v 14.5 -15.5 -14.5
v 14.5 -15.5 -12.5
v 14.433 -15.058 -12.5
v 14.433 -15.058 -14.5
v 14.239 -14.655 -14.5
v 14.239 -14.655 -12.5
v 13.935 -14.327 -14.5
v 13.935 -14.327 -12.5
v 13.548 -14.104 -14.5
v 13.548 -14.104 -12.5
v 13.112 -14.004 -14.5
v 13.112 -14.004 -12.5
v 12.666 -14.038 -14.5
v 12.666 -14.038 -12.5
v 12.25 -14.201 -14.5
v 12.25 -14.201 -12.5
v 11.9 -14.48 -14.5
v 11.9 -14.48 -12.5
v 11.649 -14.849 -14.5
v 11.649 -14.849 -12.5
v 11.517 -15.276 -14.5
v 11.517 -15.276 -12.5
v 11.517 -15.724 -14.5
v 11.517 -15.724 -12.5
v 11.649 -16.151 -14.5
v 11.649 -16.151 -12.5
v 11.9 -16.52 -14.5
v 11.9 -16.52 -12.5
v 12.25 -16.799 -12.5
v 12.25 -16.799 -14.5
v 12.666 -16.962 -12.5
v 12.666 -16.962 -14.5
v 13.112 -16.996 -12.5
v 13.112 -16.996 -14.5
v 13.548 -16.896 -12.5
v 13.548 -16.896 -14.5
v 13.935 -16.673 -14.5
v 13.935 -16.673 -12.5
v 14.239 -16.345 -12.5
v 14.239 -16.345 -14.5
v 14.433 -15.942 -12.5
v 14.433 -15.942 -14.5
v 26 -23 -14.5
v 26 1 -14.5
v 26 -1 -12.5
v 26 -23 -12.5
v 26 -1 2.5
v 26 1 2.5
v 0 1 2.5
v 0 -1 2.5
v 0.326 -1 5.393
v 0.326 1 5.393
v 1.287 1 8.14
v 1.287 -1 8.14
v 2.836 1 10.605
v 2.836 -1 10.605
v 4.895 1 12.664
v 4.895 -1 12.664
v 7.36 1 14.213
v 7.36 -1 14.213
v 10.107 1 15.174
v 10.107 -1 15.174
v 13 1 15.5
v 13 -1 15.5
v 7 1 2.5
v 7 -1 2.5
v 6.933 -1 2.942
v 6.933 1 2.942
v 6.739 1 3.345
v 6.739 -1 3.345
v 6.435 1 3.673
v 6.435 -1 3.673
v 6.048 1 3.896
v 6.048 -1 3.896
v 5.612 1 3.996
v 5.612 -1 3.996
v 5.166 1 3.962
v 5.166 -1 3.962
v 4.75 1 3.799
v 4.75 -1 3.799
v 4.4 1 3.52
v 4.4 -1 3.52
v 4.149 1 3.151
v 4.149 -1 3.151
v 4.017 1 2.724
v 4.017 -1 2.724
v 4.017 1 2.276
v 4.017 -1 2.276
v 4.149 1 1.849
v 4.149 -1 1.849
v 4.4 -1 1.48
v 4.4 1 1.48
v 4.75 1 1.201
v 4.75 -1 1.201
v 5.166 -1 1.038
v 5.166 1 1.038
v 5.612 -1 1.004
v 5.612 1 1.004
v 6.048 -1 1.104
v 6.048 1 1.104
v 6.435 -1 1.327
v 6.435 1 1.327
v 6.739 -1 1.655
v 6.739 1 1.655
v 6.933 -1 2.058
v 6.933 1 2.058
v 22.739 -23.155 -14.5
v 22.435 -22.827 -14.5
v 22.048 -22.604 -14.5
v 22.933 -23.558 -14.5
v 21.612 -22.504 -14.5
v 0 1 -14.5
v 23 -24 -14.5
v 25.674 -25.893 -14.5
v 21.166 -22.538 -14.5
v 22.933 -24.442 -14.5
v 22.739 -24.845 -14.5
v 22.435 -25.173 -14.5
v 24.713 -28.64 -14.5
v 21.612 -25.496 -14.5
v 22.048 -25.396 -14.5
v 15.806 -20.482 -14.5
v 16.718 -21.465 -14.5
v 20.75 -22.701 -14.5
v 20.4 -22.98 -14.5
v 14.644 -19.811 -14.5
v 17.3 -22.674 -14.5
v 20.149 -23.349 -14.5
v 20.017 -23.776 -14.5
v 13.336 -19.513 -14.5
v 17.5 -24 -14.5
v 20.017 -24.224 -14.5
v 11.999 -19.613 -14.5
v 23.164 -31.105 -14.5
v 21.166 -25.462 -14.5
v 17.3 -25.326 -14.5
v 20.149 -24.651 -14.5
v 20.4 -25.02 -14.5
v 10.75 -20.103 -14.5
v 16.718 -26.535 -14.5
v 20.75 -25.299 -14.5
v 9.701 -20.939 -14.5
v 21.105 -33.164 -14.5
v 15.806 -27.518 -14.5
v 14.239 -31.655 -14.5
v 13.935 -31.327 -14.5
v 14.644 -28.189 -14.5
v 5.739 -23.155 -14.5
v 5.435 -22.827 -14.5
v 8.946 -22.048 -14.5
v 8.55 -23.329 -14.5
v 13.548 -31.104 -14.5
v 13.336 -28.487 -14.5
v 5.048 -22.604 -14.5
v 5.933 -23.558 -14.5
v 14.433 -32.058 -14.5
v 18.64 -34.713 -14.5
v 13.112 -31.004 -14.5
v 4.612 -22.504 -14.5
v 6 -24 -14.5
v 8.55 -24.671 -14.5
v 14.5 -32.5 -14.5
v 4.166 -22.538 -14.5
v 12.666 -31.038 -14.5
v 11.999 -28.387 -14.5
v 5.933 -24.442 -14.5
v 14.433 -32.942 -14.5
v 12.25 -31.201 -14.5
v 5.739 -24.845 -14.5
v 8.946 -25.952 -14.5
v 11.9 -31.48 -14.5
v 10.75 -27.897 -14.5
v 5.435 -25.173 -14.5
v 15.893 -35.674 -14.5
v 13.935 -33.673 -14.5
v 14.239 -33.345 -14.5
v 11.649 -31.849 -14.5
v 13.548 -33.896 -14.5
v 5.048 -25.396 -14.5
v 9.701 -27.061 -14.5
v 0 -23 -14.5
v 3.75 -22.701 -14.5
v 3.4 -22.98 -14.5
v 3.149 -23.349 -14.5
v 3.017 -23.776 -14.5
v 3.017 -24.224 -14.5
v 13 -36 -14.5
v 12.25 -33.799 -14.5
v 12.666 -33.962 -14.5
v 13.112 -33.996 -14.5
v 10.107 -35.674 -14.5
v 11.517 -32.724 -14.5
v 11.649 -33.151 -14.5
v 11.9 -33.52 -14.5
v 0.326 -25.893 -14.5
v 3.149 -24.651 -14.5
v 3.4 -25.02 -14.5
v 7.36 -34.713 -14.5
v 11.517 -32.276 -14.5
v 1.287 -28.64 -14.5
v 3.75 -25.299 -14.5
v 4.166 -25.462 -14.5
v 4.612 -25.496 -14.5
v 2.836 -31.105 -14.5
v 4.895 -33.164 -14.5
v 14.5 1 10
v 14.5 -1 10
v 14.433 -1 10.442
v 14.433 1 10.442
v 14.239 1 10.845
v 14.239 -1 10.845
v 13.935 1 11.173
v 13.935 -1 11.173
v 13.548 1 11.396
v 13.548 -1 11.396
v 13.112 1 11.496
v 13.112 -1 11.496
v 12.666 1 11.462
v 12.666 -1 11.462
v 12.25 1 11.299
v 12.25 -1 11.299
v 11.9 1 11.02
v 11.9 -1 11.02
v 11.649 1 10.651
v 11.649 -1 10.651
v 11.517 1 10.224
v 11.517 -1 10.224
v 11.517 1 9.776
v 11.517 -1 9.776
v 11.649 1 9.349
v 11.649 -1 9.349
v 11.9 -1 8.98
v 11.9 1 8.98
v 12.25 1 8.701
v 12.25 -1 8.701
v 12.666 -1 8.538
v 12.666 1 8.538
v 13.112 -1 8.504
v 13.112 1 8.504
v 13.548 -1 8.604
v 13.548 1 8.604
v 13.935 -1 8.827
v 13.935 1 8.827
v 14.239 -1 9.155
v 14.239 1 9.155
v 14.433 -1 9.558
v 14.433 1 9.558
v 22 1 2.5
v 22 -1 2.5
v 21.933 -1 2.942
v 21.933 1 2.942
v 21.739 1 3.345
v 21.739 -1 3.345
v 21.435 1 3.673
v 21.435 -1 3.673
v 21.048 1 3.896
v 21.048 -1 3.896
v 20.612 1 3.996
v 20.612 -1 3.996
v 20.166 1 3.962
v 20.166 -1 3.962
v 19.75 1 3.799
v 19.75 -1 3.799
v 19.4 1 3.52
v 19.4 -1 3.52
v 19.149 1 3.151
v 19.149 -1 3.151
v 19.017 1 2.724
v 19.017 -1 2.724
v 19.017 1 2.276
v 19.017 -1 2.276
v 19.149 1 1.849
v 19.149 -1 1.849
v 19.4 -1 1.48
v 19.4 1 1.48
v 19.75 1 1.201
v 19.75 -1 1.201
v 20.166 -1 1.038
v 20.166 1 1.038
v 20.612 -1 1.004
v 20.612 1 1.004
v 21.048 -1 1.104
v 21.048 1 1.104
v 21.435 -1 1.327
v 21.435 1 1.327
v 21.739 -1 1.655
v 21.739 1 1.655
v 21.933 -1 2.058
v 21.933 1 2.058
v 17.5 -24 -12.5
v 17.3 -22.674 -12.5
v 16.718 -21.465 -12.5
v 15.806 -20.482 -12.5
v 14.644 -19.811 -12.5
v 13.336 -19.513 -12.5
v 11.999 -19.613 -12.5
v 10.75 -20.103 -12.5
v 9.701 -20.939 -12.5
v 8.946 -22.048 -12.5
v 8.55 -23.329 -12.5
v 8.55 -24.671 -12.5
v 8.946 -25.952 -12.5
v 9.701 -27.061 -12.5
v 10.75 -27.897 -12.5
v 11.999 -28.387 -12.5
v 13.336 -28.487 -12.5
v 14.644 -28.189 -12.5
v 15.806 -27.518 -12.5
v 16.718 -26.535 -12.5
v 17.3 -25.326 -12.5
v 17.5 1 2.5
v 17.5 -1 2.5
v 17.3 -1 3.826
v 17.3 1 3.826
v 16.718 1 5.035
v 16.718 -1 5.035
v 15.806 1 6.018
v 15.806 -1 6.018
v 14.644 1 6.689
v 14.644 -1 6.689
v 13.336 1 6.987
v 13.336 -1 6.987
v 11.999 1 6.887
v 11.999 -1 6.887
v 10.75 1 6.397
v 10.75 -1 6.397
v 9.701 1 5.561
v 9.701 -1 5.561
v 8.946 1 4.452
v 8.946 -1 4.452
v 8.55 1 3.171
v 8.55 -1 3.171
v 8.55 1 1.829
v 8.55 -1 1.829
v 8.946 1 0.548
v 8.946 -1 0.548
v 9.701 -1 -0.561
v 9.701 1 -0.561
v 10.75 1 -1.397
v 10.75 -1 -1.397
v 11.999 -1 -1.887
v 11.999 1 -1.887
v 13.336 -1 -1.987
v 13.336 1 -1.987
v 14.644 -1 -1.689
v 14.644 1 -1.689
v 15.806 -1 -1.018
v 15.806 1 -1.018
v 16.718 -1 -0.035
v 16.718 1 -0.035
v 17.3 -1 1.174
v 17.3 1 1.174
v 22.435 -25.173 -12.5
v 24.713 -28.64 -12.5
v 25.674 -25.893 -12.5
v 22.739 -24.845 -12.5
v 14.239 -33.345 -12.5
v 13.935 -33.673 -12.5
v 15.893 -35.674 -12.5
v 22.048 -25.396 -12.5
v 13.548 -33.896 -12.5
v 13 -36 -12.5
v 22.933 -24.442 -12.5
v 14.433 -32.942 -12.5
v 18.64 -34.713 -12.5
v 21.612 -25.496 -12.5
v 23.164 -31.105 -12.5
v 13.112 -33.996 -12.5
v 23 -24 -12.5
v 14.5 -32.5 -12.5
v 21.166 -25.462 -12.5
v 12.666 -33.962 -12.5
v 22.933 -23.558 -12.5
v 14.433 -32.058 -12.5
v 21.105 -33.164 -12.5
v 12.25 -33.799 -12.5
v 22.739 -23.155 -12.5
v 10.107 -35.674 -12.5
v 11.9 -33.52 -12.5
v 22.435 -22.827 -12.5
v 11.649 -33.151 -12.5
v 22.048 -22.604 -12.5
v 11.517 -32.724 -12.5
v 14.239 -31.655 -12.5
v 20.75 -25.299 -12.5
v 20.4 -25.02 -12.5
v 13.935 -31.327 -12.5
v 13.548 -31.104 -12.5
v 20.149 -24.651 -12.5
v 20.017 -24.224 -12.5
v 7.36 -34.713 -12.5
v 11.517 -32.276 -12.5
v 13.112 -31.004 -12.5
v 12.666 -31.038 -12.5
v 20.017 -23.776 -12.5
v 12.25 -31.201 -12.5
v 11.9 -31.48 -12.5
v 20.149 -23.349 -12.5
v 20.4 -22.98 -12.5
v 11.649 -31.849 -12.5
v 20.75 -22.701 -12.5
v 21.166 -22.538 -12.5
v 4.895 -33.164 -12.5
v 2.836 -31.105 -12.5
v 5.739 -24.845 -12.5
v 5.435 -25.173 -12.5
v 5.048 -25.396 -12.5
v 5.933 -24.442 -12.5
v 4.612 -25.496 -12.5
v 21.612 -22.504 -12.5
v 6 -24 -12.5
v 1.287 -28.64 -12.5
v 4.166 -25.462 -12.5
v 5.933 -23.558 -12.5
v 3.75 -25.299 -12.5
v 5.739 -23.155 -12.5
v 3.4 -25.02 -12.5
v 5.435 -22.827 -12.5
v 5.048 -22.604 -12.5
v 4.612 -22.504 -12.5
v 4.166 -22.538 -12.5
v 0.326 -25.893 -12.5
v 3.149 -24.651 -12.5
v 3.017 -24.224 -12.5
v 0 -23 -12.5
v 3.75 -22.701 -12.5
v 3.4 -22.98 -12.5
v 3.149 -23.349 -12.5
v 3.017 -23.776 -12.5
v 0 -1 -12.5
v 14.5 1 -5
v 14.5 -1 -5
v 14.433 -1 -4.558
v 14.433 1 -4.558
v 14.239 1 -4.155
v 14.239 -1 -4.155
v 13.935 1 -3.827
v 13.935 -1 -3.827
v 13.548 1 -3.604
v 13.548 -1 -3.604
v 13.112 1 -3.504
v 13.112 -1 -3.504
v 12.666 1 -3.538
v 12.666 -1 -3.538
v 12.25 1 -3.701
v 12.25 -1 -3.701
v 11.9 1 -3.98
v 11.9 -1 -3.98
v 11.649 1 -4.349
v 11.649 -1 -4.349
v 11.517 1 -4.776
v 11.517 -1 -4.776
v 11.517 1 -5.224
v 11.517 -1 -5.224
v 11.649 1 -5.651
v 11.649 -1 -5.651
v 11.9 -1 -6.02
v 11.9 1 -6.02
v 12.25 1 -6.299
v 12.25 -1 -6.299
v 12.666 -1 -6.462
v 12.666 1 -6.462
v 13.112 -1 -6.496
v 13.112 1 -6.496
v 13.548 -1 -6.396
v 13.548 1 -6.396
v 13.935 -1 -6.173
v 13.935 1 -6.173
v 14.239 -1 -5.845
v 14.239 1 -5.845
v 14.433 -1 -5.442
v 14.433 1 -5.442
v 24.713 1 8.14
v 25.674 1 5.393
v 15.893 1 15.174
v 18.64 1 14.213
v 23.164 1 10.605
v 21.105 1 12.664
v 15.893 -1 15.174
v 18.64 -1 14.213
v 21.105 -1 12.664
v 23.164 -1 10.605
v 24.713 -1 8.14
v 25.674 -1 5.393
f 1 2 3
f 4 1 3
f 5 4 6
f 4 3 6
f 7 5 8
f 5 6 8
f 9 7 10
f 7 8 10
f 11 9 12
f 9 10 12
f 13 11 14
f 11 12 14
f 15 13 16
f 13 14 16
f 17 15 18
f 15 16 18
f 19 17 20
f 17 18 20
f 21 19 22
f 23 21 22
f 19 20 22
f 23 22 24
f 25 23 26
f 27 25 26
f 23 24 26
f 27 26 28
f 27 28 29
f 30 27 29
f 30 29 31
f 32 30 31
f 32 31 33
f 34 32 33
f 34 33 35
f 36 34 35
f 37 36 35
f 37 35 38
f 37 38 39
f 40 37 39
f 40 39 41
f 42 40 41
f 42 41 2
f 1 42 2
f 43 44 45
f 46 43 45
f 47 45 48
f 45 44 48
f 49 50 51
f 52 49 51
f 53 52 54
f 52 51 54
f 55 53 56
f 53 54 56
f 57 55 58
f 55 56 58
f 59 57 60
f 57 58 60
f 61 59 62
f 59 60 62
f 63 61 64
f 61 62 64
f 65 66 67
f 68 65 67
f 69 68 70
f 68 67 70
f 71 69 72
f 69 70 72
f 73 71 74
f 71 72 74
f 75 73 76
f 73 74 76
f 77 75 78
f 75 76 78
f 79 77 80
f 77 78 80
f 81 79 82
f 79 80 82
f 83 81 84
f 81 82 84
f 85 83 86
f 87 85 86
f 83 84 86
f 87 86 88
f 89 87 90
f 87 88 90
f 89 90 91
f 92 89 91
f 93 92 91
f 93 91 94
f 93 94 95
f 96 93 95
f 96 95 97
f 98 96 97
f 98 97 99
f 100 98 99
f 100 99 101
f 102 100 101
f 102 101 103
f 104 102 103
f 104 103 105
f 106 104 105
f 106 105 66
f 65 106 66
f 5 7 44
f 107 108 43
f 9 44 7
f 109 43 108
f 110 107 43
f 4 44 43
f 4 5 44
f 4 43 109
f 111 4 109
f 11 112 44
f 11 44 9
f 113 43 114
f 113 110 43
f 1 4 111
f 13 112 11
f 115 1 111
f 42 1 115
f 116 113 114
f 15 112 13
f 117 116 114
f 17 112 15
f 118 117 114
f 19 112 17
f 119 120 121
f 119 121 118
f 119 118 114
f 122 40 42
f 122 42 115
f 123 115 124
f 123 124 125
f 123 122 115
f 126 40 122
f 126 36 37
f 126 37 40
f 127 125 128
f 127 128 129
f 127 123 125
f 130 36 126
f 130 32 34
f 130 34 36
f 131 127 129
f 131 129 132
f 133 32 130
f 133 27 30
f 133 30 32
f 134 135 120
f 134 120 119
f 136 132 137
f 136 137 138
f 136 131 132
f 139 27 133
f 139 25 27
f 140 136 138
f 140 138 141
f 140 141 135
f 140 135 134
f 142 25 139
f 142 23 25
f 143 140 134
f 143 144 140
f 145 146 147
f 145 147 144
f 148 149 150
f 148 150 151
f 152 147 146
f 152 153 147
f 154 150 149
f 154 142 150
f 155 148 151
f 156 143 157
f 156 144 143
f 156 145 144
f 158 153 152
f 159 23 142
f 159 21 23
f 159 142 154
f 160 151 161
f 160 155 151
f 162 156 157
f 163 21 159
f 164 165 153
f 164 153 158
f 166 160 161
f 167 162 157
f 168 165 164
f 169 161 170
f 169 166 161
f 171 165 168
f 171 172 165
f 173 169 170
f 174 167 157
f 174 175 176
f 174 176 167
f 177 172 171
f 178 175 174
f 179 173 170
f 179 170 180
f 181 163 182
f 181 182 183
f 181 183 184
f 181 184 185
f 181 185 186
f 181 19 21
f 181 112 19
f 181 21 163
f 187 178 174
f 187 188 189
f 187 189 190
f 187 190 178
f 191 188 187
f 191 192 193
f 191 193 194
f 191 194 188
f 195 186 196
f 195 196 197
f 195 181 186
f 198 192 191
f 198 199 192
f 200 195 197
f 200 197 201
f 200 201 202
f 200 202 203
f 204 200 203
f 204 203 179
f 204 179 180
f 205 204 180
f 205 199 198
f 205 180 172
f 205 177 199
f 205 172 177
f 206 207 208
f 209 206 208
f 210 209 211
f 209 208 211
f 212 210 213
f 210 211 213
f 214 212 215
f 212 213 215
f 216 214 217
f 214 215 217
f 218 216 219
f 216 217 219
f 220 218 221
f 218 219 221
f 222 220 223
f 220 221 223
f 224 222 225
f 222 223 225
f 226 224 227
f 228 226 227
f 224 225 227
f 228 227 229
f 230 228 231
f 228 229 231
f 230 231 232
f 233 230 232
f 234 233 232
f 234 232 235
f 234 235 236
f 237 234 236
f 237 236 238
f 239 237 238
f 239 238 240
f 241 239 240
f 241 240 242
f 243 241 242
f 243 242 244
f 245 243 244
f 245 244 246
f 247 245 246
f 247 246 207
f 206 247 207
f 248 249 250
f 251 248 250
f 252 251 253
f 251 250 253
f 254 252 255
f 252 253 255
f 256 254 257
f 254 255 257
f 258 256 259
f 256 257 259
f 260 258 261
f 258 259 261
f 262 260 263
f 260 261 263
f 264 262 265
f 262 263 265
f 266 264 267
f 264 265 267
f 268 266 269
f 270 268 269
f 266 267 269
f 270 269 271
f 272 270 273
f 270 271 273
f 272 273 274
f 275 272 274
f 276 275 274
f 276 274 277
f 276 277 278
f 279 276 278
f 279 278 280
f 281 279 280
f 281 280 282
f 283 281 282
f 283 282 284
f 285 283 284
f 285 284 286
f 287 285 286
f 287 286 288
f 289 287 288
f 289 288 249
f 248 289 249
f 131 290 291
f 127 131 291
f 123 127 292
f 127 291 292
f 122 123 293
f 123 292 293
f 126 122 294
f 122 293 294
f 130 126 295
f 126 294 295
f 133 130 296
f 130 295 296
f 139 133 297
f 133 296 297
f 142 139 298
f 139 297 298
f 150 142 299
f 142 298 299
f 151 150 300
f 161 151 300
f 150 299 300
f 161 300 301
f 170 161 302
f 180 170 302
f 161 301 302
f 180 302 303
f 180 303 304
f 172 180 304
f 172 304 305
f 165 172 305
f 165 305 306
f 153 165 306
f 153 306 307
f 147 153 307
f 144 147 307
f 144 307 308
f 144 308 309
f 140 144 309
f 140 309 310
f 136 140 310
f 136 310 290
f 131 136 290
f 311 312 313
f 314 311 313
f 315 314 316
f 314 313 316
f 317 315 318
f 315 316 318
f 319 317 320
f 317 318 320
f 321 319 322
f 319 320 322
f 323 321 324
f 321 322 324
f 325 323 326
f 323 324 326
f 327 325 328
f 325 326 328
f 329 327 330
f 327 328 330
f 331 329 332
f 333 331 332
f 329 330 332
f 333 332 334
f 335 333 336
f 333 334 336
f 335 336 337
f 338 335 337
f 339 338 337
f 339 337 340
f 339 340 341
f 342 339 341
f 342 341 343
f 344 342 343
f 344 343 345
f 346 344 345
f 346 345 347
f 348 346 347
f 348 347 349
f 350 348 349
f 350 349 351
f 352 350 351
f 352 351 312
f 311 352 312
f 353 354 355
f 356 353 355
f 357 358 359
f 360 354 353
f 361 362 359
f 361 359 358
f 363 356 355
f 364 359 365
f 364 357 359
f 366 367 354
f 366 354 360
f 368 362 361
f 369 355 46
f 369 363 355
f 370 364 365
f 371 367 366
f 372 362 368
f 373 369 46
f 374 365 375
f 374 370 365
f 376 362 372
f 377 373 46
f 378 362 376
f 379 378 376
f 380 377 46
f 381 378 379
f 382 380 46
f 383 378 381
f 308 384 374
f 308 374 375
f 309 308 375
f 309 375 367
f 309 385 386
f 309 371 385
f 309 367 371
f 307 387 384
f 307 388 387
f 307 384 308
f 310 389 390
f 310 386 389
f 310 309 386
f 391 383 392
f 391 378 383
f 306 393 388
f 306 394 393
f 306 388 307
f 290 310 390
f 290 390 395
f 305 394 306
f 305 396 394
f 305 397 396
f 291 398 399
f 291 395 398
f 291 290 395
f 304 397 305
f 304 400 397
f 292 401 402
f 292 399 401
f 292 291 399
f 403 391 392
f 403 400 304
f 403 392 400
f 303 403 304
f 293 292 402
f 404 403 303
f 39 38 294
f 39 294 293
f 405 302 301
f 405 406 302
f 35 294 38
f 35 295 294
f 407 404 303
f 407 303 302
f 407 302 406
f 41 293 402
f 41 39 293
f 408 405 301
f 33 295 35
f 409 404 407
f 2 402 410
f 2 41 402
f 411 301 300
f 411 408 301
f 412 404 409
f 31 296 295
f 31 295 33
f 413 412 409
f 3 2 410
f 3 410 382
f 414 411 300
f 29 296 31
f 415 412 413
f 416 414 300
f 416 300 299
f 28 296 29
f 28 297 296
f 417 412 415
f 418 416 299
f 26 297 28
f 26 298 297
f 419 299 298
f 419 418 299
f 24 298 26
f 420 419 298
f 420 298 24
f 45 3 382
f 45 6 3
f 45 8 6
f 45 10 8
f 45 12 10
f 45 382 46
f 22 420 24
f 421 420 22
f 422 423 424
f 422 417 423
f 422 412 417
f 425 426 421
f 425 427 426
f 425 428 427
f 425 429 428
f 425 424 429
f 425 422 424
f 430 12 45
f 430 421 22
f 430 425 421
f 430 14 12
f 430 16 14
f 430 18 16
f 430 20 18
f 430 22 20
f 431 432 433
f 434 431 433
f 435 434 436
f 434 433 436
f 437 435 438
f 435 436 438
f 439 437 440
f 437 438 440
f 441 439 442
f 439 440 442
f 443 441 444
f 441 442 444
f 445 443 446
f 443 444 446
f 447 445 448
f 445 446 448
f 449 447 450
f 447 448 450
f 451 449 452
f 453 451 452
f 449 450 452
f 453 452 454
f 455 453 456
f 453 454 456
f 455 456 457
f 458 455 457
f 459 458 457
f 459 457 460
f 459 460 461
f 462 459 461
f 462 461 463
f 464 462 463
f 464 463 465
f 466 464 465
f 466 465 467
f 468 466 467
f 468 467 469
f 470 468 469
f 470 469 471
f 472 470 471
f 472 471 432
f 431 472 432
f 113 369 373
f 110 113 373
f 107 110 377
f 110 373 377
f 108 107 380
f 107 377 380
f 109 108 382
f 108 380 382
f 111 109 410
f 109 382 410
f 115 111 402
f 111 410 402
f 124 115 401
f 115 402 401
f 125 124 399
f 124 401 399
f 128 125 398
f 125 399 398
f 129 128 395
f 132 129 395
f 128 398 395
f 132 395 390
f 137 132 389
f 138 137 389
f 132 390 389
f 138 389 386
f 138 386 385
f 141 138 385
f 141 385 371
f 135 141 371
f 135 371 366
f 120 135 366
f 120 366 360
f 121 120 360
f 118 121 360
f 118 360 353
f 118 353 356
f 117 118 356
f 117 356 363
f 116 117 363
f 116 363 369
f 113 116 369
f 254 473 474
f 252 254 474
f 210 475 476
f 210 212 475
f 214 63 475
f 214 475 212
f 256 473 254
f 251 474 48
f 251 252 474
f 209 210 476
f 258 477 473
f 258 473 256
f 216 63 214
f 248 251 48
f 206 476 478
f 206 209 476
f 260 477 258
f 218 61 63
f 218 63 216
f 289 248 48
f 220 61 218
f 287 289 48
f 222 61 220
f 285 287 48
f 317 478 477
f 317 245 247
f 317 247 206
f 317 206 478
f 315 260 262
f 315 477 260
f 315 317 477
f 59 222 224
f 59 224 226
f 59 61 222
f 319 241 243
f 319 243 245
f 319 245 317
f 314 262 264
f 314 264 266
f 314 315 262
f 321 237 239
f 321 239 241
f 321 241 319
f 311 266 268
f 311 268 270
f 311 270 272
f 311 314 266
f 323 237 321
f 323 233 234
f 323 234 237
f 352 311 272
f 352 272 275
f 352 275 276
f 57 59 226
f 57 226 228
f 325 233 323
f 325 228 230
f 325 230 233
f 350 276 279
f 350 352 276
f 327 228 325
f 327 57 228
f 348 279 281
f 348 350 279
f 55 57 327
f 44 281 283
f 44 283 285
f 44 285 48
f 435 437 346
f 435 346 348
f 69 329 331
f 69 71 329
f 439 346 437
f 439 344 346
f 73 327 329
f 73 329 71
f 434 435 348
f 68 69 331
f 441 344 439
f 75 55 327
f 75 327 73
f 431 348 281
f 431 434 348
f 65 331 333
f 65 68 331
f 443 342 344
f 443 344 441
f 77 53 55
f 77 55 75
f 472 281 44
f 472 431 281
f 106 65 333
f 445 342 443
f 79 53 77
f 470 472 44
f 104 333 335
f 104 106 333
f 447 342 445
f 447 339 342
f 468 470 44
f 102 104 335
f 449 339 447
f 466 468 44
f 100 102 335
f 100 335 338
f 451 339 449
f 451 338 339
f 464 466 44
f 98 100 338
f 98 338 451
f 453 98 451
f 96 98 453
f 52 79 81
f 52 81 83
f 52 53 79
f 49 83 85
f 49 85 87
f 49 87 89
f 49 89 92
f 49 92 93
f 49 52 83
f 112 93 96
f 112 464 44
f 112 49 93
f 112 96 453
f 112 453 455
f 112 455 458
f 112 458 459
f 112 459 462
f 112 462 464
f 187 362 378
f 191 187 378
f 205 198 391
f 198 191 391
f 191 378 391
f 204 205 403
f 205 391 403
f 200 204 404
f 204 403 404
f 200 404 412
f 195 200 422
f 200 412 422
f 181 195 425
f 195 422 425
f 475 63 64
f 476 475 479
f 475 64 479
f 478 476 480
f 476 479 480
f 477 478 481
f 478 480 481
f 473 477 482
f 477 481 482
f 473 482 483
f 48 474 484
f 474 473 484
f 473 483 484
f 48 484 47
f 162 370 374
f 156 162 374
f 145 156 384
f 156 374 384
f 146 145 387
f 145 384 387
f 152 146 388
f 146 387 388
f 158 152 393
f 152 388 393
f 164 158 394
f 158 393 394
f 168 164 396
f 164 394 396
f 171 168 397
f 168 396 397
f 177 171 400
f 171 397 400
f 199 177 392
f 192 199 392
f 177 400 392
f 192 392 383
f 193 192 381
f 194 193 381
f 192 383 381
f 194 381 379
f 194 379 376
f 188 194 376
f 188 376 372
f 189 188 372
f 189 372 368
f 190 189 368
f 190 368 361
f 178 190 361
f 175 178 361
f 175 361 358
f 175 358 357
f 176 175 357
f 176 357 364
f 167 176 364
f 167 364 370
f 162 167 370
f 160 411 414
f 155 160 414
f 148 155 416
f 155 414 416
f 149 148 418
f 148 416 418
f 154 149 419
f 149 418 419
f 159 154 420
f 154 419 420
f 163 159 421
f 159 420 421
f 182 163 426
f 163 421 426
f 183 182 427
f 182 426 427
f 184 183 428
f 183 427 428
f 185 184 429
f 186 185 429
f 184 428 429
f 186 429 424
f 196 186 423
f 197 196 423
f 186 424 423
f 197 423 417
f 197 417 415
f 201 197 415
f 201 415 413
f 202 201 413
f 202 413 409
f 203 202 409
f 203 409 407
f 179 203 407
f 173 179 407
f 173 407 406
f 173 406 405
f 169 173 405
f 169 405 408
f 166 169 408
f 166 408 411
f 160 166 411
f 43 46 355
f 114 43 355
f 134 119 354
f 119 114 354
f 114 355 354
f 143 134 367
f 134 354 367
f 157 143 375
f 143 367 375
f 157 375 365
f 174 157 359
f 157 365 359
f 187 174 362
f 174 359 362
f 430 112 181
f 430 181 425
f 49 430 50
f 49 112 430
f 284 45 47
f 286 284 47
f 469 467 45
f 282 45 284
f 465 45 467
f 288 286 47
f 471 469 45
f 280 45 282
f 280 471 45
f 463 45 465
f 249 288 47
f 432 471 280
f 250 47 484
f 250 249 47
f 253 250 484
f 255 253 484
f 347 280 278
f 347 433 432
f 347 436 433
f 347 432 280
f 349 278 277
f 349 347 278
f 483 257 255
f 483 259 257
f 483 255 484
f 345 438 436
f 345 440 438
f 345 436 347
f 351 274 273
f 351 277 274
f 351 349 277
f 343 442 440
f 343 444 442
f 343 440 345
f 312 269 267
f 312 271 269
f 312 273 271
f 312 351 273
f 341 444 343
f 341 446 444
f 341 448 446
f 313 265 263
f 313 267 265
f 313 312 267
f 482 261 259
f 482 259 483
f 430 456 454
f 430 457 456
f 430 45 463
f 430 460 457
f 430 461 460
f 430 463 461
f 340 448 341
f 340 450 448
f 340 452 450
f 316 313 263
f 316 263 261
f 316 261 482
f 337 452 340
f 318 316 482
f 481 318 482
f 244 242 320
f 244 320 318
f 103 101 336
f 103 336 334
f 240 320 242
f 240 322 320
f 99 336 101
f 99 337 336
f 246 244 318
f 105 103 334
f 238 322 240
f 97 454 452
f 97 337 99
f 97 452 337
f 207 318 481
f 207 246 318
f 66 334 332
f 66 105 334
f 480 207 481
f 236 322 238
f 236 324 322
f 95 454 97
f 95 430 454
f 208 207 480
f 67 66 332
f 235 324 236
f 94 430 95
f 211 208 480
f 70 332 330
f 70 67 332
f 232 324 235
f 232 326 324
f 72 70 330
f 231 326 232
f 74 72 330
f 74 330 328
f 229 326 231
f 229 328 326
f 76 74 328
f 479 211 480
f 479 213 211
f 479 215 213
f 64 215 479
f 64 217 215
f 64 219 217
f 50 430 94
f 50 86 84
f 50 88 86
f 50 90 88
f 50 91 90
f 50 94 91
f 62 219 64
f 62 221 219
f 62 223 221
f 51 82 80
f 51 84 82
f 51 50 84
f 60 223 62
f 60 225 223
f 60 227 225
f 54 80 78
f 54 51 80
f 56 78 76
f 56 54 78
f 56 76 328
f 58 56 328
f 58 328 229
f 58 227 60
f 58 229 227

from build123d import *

# Parameters (mm, degrees)
BOSS_EXTRUDE1_DEPTH = 26
SKETCH4_R           = 4.5
SKETCH4_R_2         = 1.5
CUT_EXTRUDE2_DEPTH  = 3
SKETCH5_R           = 1.5
SKETCH5_R_2         = 4.5
CUT_EXTRUDE3_DEPTH  = 3


with BuildPart() as part:
    # Sketch2 → Boss-Extrude1 (new body)
    with BuildSketch(Plane(origin=(0, 0, 0), x_dir=(0, 0, -1), z_dir=(1, 0, 0))):
        Polygon((-15.5, 1), (14.5, 1), (14.5, -36), (12.5, -36), (12.5, -1), (-15.5, -1), align=None)
    extrude(amount=BOSS_EXTRUDE1_DEPTH)

    # Sketch4 → Cut-Extrude2 (cut, through all)
    with BuildSketch(Plane.XY.offset(-12.5)):
        with Locations((13, -24)):
            Circle(SKETCH4_R)
        with Locations((4.5, -24)):
            Circle(SKETCH4_R_2)
        with Locations((13, -32.5)):
            Circle(SKETCH4_R_2)
        with Locations((21.5, -24)):
            Circle(SKETCH4_R_2)
        with Locations((13, -15.5)):
            Circle(SKETCH4_R_2)
        with BuildLine():
            ThreePointArc((13, -36), (3.807611845, -32.192388155), (0, -23))
            Line((0, -23), (0, -36))
            Line((0, -36), (13, -36))
        make_face()
        with BuildLine():
            ThreePointArc((26, -23), (22.192388155, -32.192388155), (13, -36))
            Line((13, -36), (26, -36))
            Line((26, -36), (26, -23))
        make_face()
    extrude(amount=-CUT_EXTRUDE2_DEPTH, mode=Mode.SUBTRACT)

    # Sketch5 → Cut-Extrude3 (cut, through all)
    with BuildSketch(Plane.XZ.offset(1)):
        with Locations((5.5, 2.5)):
            Circle(SKETCH5_R)
        with Locations((13, -5)):
            Circle(SKETCH5_R)
        with Locations((13, 2.5)):
            Circle(SKETCH5_R_2)
        with Locations((20.5, 2.5)):
            Circle(SKETCH5_R)
        with BuildLine():
            Line((13, 15.5), (0, 15.5))
            Line((0, 15.5), (0, 2.5))
            ThreePointArc((0, 2.5), (3.807611845, 11.692388155), (13, 15.5))
        make_face()
        with BuildLine():
            Line((26, 15.5), (13, 15.5))
            ThreePointArc((13, 15.5), (22.192388155, 11.692388155), (26, 2.5))
            Line((26, 2.5), (26, 15.5))
        make_face()
        with Locations((13, 10)):
            Circle(SKETCH5_R)
    extrude(amount=-CUT_EXTRUDE3_DEPTH, mode=Mode.SUBTRACT)


solid = part.part
